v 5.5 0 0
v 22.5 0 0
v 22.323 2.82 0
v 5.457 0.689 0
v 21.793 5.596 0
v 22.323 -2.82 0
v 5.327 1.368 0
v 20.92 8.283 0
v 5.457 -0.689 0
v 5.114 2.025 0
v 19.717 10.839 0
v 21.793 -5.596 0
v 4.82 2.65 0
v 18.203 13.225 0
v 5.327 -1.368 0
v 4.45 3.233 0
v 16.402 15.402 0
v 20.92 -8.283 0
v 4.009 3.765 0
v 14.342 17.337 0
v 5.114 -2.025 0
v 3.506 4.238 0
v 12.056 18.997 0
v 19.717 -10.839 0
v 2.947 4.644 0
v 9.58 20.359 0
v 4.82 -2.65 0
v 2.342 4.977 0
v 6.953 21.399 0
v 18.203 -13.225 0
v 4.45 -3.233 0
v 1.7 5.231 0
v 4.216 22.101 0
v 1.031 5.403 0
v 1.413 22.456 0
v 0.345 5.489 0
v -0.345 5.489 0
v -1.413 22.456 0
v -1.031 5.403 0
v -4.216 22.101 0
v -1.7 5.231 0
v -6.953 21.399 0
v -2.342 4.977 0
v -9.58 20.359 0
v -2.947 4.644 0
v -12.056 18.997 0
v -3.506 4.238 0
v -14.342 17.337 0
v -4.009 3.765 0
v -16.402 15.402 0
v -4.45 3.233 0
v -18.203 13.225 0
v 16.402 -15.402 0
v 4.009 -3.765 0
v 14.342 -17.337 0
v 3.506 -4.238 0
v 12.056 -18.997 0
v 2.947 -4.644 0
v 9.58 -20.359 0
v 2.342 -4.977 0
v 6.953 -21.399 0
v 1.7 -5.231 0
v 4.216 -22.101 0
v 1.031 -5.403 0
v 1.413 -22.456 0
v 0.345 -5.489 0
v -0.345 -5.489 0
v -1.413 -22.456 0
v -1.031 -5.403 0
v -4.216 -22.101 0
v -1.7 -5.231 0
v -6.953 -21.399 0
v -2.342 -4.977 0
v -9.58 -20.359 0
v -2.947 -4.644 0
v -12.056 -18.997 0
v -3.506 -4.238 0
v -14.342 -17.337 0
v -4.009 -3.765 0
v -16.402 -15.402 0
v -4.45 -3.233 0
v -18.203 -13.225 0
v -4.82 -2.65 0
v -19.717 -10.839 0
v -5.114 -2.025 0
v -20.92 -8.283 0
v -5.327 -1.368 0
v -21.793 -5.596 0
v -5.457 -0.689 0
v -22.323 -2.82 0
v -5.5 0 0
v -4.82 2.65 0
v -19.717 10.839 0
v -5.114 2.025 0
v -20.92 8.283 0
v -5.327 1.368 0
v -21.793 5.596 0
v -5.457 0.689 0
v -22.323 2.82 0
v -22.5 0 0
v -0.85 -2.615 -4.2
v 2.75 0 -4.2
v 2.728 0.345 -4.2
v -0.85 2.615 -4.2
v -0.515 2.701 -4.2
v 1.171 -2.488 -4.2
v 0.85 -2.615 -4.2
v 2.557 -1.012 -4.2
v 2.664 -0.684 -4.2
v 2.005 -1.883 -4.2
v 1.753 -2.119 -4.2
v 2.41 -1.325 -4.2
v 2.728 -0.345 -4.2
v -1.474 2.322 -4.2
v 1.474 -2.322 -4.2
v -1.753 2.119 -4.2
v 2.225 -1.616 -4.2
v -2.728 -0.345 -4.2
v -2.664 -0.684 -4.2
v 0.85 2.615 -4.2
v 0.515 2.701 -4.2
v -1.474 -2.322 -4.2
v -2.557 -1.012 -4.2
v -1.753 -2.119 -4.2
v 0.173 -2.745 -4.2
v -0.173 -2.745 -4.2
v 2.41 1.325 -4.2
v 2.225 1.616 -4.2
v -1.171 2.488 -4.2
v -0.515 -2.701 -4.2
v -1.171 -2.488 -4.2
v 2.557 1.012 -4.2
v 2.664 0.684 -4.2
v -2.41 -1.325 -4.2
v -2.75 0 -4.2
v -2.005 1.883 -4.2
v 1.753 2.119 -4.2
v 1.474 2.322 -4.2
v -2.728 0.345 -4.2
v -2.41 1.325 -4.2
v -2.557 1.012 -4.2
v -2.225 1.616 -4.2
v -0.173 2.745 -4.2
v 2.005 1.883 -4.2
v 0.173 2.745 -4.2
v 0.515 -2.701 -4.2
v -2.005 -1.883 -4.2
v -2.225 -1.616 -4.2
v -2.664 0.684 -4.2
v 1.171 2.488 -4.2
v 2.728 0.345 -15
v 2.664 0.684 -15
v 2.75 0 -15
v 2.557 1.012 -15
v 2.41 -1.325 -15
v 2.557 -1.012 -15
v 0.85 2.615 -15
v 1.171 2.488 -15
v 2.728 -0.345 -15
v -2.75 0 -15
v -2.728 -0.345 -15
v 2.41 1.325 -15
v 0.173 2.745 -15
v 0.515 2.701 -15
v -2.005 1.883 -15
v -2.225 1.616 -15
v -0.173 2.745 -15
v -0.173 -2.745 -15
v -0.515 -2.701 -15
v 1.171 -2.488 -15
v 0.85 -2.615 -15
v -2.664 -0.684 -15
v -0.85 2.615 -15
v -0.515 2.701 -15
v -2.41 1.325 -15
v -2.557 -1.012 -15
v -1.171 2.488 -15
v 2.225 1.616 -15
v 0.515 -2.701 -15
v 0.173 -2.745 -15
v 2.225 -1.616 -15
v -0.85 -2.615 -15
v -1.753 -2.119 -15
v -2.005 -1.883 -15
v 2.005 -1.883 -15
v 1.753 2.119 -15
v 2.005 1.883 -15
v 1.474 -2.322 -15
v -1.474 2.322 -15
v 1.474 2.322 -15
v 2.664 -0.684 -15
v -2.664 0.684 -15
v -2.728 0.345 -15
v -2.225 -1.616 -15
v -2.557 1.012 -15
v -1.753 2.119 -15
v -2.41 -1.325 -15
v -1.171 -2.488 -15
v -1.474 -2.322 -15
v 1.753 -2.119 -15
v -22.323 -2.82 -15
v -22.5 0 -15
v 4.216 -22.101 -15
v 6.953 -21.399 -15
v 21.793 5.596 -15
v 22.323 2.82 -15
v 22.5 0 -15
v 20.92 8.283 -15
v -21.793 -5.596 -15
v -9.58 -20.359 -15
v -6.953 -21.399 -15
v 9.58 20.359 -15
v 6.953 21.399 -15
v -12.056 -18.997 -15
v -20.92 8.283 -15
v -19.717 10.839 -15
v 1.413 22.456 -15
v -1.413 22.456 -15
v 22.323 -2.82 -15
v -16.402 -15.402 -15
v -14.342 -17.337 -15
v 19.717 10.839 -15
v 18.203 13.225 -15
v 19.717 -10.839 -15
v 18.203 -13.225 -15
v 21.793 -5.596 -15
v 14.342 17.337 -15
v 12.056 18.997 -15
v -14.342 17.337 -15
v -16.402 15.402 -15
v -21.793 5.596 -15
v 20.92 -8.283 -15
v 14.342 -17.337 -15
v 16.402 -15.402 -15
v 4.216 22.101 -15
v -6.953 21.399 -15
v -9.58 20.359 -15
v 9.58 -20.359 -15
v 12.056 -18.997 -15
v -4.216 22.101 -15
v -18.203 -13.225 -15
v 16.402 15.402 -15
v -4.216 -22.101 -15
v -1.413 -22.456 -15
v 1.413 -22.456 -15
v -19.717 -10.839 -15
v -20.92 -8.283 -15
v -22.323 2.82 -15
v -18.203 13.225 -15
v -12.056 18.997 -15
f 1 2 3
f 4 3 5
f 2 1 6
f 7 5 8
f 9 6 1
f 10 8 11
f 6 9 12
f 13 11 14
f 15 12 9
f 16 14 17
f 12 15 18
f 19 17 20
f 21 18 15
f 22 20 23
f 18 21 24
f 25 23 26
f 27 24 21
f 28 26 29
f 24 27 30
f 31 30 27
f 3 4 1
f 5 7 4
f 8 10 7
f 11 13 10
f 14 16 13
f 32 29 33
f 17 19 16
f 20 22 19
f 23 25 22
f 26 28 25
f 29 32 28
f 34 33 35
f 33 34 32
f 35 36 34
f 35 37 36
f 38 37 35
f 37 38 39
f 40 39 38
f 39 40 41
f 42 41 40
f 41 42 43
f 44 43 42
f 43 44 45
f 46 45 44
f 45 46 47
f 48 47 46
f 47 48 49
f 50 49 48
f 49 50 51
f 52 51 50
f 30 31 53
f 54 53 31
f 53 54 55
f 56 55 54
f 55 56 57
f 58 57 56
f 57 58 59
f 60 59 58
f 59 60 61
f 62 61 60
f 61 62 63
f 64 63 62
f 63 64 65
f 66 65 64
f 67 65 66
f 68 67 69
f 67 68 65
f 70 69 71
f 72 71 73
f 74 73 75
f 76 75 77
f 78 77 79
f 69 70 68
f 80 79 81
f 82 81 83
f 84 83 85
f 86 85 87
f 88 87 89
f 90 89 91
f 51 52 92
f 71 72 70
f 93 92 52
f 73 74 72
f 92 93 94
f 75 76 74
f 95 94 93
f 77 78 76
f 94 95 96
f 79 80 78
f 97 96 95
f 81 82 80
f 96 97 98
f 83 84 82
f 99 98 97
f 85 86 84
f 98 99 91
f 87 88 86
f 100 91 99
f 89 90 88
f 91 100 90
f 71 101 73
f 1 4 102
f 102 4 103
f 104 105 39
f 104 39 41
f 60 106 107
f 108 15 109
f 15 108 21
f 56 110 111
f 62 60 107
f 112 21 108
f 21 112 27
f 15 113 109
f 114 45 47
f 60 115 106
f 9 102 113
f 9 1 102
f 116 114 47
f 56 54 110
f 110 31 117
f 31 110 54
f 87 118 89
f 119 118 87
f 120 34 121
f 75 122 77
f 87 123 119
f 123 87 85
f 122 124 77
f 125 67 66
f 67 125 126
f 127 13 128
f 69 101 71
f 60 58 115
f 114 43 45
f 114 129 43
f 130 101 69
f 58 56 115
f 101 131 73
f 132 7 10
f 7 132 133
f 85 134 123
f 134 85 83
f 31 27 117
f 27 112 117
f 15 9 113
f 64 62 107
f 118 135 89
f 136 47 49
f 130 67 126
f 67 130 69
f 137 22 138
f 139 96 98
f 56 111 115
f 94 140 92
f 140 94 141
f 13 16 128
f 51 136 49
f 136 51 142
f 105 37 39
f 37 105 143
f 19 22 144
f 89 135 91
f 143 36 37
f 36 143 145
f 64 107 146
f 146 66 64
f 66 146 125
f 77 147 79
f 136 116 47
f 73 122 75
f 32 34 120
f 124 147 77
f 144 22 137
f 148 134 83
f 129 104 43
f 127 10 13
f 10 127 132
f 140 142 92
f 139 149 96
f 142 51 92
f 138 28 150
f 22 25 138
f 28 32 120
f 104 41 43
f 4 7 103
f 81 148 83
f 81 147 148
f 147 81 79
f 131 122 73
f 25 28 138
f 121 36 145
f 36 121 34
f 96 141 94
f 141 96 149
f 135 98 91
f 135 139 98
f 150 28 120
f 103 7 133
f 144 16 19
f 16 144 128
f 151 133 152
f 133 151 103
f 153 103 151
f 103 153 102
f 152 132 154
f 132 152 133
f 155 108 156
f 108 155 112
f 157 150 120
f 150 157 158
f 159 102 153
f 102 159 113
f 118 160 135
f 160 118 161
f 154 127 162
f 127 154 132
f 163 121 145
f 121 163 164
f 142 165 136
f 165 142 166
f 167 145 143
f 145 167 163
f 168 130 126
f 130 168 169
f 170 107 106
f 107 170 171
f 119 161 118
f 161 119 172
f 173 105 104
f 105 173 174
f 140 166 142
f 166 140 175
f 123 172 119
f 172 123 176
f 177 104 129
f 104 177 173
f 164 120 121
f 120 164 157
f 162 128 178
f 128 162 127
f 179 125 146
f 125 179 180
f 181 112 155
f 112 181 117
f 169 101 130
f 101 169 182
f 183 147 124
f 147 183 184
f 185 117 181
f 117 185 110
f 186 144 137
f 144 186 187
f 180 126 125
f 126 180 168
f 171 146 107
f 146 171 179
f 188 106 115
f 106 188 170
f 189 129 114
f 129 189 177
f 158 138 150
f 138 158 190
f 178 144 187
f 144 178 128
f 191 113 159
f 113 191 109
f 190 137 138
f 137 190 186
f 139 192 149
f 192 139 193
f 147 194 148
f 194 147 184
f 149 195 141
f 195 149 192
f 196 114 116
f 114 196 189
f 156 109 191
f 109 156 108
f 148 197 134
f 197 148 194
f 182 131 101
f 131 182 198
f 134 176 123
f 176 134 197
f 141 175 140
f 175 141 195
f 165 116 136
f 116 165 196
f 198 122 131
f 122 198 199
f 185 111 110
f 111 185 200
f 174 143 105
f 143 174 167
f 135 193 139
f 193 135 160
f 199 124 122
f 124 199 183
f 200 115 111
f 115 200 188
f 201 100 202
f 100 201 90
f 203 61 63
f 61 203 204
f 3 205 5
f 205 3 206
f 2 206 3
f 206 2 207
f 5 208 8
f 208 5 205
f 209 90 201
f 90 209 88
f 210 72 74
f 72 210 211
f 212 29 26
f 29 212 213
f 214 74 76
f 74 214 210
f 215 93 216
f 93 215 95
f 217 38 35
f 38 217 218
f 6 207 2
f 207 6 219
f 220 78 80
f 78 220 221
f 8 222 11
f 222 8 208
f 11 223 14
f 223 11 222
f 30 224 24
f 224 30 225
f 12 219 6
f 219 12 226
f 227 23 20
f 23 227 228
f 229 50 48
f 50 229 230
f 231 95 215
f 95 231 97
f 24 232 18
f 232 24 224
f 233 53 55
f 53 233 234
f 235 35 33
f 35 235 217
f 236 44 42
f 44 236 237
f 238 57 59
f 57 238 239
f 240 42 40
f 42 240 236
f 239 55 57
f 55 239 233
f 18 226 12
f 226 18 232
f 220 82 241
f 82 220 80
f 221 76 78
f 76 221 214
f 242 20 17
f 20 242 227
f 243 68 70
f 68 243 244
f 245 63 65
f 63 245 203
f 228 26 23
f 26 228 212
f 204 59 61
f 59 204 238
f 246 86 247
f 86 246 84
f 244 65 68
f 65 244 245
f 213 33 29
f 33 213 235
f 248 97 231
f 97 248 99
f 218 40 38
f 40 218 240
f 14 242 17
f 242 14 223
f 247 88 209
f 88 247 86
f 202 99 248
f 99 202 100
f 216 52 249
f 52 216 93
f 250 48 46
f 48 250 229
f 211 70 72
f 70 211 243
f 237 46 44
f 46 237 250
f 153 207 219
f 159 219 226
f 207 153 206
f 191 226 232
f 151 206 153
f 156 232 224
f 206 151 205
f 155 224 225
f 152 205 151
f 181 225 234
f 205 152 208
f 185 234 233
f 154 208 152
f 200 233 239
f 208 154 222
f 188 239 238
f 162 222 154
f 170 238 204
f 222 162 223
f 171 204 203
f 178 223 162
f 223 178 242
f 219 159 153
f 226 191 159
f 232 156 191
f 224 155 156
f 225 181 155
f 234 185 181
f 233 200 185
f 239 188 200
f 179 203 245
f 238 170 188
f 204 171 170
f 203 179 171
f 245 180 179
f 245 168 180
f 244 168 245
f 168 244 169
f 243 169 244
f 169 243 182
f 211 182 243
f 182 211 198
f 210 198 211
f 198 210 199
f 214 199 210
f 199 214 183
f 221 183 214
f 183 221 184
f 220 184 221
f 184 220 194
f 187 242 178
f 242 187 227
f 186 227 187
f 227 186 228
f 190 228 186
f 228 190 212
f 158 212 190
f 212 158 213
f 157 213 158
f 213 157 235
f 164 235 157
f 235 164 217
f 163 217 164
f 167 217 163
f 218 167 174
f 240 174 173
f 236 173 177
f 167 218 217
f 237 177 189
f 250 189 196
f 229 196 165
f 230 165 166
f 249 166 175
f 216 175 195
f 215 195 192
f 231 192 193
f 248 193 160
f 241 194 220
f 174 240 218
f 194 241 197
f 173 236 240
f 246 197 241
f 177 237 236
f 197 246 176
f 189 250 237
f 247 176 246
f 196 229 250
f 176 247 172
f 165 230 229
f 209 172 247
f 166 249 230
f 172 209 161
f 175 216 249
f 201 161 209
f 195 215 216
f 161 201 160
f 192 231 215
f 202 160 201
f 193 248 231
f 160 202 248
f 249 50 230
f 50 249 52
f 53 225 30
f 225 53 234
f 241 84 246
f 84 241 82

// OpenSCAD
$fn = 50;

difference() {
	union() {
		translate(v = [0, 0, -15.0]) {
			cylinder(h = 15, r = 22.5);
		}
	}
	union() {
		translate(v = [0, 0, 0]) {
			rotate(a = [0, 0, 0]) {
				difference() {
					union() {
						translate(v = [0, 0, -18.0]) {
							cylinder(h = 18, r = 2.25);
						}
						translate(v = [0, 0, -4.2]) {
							cylinder(h = 4.2, r1 = 2.75, r2 = 5.5);
						}
						translate(v = [0, 0, -18.0]) {
							cylinder(h = 18, r = 2.75);
						}
						translate(v = [0, 0, -18.0]) {
							cylinder(h = 18, r = 2.25);
						}
					}
					union();
				}
			}
		}
	}
}
